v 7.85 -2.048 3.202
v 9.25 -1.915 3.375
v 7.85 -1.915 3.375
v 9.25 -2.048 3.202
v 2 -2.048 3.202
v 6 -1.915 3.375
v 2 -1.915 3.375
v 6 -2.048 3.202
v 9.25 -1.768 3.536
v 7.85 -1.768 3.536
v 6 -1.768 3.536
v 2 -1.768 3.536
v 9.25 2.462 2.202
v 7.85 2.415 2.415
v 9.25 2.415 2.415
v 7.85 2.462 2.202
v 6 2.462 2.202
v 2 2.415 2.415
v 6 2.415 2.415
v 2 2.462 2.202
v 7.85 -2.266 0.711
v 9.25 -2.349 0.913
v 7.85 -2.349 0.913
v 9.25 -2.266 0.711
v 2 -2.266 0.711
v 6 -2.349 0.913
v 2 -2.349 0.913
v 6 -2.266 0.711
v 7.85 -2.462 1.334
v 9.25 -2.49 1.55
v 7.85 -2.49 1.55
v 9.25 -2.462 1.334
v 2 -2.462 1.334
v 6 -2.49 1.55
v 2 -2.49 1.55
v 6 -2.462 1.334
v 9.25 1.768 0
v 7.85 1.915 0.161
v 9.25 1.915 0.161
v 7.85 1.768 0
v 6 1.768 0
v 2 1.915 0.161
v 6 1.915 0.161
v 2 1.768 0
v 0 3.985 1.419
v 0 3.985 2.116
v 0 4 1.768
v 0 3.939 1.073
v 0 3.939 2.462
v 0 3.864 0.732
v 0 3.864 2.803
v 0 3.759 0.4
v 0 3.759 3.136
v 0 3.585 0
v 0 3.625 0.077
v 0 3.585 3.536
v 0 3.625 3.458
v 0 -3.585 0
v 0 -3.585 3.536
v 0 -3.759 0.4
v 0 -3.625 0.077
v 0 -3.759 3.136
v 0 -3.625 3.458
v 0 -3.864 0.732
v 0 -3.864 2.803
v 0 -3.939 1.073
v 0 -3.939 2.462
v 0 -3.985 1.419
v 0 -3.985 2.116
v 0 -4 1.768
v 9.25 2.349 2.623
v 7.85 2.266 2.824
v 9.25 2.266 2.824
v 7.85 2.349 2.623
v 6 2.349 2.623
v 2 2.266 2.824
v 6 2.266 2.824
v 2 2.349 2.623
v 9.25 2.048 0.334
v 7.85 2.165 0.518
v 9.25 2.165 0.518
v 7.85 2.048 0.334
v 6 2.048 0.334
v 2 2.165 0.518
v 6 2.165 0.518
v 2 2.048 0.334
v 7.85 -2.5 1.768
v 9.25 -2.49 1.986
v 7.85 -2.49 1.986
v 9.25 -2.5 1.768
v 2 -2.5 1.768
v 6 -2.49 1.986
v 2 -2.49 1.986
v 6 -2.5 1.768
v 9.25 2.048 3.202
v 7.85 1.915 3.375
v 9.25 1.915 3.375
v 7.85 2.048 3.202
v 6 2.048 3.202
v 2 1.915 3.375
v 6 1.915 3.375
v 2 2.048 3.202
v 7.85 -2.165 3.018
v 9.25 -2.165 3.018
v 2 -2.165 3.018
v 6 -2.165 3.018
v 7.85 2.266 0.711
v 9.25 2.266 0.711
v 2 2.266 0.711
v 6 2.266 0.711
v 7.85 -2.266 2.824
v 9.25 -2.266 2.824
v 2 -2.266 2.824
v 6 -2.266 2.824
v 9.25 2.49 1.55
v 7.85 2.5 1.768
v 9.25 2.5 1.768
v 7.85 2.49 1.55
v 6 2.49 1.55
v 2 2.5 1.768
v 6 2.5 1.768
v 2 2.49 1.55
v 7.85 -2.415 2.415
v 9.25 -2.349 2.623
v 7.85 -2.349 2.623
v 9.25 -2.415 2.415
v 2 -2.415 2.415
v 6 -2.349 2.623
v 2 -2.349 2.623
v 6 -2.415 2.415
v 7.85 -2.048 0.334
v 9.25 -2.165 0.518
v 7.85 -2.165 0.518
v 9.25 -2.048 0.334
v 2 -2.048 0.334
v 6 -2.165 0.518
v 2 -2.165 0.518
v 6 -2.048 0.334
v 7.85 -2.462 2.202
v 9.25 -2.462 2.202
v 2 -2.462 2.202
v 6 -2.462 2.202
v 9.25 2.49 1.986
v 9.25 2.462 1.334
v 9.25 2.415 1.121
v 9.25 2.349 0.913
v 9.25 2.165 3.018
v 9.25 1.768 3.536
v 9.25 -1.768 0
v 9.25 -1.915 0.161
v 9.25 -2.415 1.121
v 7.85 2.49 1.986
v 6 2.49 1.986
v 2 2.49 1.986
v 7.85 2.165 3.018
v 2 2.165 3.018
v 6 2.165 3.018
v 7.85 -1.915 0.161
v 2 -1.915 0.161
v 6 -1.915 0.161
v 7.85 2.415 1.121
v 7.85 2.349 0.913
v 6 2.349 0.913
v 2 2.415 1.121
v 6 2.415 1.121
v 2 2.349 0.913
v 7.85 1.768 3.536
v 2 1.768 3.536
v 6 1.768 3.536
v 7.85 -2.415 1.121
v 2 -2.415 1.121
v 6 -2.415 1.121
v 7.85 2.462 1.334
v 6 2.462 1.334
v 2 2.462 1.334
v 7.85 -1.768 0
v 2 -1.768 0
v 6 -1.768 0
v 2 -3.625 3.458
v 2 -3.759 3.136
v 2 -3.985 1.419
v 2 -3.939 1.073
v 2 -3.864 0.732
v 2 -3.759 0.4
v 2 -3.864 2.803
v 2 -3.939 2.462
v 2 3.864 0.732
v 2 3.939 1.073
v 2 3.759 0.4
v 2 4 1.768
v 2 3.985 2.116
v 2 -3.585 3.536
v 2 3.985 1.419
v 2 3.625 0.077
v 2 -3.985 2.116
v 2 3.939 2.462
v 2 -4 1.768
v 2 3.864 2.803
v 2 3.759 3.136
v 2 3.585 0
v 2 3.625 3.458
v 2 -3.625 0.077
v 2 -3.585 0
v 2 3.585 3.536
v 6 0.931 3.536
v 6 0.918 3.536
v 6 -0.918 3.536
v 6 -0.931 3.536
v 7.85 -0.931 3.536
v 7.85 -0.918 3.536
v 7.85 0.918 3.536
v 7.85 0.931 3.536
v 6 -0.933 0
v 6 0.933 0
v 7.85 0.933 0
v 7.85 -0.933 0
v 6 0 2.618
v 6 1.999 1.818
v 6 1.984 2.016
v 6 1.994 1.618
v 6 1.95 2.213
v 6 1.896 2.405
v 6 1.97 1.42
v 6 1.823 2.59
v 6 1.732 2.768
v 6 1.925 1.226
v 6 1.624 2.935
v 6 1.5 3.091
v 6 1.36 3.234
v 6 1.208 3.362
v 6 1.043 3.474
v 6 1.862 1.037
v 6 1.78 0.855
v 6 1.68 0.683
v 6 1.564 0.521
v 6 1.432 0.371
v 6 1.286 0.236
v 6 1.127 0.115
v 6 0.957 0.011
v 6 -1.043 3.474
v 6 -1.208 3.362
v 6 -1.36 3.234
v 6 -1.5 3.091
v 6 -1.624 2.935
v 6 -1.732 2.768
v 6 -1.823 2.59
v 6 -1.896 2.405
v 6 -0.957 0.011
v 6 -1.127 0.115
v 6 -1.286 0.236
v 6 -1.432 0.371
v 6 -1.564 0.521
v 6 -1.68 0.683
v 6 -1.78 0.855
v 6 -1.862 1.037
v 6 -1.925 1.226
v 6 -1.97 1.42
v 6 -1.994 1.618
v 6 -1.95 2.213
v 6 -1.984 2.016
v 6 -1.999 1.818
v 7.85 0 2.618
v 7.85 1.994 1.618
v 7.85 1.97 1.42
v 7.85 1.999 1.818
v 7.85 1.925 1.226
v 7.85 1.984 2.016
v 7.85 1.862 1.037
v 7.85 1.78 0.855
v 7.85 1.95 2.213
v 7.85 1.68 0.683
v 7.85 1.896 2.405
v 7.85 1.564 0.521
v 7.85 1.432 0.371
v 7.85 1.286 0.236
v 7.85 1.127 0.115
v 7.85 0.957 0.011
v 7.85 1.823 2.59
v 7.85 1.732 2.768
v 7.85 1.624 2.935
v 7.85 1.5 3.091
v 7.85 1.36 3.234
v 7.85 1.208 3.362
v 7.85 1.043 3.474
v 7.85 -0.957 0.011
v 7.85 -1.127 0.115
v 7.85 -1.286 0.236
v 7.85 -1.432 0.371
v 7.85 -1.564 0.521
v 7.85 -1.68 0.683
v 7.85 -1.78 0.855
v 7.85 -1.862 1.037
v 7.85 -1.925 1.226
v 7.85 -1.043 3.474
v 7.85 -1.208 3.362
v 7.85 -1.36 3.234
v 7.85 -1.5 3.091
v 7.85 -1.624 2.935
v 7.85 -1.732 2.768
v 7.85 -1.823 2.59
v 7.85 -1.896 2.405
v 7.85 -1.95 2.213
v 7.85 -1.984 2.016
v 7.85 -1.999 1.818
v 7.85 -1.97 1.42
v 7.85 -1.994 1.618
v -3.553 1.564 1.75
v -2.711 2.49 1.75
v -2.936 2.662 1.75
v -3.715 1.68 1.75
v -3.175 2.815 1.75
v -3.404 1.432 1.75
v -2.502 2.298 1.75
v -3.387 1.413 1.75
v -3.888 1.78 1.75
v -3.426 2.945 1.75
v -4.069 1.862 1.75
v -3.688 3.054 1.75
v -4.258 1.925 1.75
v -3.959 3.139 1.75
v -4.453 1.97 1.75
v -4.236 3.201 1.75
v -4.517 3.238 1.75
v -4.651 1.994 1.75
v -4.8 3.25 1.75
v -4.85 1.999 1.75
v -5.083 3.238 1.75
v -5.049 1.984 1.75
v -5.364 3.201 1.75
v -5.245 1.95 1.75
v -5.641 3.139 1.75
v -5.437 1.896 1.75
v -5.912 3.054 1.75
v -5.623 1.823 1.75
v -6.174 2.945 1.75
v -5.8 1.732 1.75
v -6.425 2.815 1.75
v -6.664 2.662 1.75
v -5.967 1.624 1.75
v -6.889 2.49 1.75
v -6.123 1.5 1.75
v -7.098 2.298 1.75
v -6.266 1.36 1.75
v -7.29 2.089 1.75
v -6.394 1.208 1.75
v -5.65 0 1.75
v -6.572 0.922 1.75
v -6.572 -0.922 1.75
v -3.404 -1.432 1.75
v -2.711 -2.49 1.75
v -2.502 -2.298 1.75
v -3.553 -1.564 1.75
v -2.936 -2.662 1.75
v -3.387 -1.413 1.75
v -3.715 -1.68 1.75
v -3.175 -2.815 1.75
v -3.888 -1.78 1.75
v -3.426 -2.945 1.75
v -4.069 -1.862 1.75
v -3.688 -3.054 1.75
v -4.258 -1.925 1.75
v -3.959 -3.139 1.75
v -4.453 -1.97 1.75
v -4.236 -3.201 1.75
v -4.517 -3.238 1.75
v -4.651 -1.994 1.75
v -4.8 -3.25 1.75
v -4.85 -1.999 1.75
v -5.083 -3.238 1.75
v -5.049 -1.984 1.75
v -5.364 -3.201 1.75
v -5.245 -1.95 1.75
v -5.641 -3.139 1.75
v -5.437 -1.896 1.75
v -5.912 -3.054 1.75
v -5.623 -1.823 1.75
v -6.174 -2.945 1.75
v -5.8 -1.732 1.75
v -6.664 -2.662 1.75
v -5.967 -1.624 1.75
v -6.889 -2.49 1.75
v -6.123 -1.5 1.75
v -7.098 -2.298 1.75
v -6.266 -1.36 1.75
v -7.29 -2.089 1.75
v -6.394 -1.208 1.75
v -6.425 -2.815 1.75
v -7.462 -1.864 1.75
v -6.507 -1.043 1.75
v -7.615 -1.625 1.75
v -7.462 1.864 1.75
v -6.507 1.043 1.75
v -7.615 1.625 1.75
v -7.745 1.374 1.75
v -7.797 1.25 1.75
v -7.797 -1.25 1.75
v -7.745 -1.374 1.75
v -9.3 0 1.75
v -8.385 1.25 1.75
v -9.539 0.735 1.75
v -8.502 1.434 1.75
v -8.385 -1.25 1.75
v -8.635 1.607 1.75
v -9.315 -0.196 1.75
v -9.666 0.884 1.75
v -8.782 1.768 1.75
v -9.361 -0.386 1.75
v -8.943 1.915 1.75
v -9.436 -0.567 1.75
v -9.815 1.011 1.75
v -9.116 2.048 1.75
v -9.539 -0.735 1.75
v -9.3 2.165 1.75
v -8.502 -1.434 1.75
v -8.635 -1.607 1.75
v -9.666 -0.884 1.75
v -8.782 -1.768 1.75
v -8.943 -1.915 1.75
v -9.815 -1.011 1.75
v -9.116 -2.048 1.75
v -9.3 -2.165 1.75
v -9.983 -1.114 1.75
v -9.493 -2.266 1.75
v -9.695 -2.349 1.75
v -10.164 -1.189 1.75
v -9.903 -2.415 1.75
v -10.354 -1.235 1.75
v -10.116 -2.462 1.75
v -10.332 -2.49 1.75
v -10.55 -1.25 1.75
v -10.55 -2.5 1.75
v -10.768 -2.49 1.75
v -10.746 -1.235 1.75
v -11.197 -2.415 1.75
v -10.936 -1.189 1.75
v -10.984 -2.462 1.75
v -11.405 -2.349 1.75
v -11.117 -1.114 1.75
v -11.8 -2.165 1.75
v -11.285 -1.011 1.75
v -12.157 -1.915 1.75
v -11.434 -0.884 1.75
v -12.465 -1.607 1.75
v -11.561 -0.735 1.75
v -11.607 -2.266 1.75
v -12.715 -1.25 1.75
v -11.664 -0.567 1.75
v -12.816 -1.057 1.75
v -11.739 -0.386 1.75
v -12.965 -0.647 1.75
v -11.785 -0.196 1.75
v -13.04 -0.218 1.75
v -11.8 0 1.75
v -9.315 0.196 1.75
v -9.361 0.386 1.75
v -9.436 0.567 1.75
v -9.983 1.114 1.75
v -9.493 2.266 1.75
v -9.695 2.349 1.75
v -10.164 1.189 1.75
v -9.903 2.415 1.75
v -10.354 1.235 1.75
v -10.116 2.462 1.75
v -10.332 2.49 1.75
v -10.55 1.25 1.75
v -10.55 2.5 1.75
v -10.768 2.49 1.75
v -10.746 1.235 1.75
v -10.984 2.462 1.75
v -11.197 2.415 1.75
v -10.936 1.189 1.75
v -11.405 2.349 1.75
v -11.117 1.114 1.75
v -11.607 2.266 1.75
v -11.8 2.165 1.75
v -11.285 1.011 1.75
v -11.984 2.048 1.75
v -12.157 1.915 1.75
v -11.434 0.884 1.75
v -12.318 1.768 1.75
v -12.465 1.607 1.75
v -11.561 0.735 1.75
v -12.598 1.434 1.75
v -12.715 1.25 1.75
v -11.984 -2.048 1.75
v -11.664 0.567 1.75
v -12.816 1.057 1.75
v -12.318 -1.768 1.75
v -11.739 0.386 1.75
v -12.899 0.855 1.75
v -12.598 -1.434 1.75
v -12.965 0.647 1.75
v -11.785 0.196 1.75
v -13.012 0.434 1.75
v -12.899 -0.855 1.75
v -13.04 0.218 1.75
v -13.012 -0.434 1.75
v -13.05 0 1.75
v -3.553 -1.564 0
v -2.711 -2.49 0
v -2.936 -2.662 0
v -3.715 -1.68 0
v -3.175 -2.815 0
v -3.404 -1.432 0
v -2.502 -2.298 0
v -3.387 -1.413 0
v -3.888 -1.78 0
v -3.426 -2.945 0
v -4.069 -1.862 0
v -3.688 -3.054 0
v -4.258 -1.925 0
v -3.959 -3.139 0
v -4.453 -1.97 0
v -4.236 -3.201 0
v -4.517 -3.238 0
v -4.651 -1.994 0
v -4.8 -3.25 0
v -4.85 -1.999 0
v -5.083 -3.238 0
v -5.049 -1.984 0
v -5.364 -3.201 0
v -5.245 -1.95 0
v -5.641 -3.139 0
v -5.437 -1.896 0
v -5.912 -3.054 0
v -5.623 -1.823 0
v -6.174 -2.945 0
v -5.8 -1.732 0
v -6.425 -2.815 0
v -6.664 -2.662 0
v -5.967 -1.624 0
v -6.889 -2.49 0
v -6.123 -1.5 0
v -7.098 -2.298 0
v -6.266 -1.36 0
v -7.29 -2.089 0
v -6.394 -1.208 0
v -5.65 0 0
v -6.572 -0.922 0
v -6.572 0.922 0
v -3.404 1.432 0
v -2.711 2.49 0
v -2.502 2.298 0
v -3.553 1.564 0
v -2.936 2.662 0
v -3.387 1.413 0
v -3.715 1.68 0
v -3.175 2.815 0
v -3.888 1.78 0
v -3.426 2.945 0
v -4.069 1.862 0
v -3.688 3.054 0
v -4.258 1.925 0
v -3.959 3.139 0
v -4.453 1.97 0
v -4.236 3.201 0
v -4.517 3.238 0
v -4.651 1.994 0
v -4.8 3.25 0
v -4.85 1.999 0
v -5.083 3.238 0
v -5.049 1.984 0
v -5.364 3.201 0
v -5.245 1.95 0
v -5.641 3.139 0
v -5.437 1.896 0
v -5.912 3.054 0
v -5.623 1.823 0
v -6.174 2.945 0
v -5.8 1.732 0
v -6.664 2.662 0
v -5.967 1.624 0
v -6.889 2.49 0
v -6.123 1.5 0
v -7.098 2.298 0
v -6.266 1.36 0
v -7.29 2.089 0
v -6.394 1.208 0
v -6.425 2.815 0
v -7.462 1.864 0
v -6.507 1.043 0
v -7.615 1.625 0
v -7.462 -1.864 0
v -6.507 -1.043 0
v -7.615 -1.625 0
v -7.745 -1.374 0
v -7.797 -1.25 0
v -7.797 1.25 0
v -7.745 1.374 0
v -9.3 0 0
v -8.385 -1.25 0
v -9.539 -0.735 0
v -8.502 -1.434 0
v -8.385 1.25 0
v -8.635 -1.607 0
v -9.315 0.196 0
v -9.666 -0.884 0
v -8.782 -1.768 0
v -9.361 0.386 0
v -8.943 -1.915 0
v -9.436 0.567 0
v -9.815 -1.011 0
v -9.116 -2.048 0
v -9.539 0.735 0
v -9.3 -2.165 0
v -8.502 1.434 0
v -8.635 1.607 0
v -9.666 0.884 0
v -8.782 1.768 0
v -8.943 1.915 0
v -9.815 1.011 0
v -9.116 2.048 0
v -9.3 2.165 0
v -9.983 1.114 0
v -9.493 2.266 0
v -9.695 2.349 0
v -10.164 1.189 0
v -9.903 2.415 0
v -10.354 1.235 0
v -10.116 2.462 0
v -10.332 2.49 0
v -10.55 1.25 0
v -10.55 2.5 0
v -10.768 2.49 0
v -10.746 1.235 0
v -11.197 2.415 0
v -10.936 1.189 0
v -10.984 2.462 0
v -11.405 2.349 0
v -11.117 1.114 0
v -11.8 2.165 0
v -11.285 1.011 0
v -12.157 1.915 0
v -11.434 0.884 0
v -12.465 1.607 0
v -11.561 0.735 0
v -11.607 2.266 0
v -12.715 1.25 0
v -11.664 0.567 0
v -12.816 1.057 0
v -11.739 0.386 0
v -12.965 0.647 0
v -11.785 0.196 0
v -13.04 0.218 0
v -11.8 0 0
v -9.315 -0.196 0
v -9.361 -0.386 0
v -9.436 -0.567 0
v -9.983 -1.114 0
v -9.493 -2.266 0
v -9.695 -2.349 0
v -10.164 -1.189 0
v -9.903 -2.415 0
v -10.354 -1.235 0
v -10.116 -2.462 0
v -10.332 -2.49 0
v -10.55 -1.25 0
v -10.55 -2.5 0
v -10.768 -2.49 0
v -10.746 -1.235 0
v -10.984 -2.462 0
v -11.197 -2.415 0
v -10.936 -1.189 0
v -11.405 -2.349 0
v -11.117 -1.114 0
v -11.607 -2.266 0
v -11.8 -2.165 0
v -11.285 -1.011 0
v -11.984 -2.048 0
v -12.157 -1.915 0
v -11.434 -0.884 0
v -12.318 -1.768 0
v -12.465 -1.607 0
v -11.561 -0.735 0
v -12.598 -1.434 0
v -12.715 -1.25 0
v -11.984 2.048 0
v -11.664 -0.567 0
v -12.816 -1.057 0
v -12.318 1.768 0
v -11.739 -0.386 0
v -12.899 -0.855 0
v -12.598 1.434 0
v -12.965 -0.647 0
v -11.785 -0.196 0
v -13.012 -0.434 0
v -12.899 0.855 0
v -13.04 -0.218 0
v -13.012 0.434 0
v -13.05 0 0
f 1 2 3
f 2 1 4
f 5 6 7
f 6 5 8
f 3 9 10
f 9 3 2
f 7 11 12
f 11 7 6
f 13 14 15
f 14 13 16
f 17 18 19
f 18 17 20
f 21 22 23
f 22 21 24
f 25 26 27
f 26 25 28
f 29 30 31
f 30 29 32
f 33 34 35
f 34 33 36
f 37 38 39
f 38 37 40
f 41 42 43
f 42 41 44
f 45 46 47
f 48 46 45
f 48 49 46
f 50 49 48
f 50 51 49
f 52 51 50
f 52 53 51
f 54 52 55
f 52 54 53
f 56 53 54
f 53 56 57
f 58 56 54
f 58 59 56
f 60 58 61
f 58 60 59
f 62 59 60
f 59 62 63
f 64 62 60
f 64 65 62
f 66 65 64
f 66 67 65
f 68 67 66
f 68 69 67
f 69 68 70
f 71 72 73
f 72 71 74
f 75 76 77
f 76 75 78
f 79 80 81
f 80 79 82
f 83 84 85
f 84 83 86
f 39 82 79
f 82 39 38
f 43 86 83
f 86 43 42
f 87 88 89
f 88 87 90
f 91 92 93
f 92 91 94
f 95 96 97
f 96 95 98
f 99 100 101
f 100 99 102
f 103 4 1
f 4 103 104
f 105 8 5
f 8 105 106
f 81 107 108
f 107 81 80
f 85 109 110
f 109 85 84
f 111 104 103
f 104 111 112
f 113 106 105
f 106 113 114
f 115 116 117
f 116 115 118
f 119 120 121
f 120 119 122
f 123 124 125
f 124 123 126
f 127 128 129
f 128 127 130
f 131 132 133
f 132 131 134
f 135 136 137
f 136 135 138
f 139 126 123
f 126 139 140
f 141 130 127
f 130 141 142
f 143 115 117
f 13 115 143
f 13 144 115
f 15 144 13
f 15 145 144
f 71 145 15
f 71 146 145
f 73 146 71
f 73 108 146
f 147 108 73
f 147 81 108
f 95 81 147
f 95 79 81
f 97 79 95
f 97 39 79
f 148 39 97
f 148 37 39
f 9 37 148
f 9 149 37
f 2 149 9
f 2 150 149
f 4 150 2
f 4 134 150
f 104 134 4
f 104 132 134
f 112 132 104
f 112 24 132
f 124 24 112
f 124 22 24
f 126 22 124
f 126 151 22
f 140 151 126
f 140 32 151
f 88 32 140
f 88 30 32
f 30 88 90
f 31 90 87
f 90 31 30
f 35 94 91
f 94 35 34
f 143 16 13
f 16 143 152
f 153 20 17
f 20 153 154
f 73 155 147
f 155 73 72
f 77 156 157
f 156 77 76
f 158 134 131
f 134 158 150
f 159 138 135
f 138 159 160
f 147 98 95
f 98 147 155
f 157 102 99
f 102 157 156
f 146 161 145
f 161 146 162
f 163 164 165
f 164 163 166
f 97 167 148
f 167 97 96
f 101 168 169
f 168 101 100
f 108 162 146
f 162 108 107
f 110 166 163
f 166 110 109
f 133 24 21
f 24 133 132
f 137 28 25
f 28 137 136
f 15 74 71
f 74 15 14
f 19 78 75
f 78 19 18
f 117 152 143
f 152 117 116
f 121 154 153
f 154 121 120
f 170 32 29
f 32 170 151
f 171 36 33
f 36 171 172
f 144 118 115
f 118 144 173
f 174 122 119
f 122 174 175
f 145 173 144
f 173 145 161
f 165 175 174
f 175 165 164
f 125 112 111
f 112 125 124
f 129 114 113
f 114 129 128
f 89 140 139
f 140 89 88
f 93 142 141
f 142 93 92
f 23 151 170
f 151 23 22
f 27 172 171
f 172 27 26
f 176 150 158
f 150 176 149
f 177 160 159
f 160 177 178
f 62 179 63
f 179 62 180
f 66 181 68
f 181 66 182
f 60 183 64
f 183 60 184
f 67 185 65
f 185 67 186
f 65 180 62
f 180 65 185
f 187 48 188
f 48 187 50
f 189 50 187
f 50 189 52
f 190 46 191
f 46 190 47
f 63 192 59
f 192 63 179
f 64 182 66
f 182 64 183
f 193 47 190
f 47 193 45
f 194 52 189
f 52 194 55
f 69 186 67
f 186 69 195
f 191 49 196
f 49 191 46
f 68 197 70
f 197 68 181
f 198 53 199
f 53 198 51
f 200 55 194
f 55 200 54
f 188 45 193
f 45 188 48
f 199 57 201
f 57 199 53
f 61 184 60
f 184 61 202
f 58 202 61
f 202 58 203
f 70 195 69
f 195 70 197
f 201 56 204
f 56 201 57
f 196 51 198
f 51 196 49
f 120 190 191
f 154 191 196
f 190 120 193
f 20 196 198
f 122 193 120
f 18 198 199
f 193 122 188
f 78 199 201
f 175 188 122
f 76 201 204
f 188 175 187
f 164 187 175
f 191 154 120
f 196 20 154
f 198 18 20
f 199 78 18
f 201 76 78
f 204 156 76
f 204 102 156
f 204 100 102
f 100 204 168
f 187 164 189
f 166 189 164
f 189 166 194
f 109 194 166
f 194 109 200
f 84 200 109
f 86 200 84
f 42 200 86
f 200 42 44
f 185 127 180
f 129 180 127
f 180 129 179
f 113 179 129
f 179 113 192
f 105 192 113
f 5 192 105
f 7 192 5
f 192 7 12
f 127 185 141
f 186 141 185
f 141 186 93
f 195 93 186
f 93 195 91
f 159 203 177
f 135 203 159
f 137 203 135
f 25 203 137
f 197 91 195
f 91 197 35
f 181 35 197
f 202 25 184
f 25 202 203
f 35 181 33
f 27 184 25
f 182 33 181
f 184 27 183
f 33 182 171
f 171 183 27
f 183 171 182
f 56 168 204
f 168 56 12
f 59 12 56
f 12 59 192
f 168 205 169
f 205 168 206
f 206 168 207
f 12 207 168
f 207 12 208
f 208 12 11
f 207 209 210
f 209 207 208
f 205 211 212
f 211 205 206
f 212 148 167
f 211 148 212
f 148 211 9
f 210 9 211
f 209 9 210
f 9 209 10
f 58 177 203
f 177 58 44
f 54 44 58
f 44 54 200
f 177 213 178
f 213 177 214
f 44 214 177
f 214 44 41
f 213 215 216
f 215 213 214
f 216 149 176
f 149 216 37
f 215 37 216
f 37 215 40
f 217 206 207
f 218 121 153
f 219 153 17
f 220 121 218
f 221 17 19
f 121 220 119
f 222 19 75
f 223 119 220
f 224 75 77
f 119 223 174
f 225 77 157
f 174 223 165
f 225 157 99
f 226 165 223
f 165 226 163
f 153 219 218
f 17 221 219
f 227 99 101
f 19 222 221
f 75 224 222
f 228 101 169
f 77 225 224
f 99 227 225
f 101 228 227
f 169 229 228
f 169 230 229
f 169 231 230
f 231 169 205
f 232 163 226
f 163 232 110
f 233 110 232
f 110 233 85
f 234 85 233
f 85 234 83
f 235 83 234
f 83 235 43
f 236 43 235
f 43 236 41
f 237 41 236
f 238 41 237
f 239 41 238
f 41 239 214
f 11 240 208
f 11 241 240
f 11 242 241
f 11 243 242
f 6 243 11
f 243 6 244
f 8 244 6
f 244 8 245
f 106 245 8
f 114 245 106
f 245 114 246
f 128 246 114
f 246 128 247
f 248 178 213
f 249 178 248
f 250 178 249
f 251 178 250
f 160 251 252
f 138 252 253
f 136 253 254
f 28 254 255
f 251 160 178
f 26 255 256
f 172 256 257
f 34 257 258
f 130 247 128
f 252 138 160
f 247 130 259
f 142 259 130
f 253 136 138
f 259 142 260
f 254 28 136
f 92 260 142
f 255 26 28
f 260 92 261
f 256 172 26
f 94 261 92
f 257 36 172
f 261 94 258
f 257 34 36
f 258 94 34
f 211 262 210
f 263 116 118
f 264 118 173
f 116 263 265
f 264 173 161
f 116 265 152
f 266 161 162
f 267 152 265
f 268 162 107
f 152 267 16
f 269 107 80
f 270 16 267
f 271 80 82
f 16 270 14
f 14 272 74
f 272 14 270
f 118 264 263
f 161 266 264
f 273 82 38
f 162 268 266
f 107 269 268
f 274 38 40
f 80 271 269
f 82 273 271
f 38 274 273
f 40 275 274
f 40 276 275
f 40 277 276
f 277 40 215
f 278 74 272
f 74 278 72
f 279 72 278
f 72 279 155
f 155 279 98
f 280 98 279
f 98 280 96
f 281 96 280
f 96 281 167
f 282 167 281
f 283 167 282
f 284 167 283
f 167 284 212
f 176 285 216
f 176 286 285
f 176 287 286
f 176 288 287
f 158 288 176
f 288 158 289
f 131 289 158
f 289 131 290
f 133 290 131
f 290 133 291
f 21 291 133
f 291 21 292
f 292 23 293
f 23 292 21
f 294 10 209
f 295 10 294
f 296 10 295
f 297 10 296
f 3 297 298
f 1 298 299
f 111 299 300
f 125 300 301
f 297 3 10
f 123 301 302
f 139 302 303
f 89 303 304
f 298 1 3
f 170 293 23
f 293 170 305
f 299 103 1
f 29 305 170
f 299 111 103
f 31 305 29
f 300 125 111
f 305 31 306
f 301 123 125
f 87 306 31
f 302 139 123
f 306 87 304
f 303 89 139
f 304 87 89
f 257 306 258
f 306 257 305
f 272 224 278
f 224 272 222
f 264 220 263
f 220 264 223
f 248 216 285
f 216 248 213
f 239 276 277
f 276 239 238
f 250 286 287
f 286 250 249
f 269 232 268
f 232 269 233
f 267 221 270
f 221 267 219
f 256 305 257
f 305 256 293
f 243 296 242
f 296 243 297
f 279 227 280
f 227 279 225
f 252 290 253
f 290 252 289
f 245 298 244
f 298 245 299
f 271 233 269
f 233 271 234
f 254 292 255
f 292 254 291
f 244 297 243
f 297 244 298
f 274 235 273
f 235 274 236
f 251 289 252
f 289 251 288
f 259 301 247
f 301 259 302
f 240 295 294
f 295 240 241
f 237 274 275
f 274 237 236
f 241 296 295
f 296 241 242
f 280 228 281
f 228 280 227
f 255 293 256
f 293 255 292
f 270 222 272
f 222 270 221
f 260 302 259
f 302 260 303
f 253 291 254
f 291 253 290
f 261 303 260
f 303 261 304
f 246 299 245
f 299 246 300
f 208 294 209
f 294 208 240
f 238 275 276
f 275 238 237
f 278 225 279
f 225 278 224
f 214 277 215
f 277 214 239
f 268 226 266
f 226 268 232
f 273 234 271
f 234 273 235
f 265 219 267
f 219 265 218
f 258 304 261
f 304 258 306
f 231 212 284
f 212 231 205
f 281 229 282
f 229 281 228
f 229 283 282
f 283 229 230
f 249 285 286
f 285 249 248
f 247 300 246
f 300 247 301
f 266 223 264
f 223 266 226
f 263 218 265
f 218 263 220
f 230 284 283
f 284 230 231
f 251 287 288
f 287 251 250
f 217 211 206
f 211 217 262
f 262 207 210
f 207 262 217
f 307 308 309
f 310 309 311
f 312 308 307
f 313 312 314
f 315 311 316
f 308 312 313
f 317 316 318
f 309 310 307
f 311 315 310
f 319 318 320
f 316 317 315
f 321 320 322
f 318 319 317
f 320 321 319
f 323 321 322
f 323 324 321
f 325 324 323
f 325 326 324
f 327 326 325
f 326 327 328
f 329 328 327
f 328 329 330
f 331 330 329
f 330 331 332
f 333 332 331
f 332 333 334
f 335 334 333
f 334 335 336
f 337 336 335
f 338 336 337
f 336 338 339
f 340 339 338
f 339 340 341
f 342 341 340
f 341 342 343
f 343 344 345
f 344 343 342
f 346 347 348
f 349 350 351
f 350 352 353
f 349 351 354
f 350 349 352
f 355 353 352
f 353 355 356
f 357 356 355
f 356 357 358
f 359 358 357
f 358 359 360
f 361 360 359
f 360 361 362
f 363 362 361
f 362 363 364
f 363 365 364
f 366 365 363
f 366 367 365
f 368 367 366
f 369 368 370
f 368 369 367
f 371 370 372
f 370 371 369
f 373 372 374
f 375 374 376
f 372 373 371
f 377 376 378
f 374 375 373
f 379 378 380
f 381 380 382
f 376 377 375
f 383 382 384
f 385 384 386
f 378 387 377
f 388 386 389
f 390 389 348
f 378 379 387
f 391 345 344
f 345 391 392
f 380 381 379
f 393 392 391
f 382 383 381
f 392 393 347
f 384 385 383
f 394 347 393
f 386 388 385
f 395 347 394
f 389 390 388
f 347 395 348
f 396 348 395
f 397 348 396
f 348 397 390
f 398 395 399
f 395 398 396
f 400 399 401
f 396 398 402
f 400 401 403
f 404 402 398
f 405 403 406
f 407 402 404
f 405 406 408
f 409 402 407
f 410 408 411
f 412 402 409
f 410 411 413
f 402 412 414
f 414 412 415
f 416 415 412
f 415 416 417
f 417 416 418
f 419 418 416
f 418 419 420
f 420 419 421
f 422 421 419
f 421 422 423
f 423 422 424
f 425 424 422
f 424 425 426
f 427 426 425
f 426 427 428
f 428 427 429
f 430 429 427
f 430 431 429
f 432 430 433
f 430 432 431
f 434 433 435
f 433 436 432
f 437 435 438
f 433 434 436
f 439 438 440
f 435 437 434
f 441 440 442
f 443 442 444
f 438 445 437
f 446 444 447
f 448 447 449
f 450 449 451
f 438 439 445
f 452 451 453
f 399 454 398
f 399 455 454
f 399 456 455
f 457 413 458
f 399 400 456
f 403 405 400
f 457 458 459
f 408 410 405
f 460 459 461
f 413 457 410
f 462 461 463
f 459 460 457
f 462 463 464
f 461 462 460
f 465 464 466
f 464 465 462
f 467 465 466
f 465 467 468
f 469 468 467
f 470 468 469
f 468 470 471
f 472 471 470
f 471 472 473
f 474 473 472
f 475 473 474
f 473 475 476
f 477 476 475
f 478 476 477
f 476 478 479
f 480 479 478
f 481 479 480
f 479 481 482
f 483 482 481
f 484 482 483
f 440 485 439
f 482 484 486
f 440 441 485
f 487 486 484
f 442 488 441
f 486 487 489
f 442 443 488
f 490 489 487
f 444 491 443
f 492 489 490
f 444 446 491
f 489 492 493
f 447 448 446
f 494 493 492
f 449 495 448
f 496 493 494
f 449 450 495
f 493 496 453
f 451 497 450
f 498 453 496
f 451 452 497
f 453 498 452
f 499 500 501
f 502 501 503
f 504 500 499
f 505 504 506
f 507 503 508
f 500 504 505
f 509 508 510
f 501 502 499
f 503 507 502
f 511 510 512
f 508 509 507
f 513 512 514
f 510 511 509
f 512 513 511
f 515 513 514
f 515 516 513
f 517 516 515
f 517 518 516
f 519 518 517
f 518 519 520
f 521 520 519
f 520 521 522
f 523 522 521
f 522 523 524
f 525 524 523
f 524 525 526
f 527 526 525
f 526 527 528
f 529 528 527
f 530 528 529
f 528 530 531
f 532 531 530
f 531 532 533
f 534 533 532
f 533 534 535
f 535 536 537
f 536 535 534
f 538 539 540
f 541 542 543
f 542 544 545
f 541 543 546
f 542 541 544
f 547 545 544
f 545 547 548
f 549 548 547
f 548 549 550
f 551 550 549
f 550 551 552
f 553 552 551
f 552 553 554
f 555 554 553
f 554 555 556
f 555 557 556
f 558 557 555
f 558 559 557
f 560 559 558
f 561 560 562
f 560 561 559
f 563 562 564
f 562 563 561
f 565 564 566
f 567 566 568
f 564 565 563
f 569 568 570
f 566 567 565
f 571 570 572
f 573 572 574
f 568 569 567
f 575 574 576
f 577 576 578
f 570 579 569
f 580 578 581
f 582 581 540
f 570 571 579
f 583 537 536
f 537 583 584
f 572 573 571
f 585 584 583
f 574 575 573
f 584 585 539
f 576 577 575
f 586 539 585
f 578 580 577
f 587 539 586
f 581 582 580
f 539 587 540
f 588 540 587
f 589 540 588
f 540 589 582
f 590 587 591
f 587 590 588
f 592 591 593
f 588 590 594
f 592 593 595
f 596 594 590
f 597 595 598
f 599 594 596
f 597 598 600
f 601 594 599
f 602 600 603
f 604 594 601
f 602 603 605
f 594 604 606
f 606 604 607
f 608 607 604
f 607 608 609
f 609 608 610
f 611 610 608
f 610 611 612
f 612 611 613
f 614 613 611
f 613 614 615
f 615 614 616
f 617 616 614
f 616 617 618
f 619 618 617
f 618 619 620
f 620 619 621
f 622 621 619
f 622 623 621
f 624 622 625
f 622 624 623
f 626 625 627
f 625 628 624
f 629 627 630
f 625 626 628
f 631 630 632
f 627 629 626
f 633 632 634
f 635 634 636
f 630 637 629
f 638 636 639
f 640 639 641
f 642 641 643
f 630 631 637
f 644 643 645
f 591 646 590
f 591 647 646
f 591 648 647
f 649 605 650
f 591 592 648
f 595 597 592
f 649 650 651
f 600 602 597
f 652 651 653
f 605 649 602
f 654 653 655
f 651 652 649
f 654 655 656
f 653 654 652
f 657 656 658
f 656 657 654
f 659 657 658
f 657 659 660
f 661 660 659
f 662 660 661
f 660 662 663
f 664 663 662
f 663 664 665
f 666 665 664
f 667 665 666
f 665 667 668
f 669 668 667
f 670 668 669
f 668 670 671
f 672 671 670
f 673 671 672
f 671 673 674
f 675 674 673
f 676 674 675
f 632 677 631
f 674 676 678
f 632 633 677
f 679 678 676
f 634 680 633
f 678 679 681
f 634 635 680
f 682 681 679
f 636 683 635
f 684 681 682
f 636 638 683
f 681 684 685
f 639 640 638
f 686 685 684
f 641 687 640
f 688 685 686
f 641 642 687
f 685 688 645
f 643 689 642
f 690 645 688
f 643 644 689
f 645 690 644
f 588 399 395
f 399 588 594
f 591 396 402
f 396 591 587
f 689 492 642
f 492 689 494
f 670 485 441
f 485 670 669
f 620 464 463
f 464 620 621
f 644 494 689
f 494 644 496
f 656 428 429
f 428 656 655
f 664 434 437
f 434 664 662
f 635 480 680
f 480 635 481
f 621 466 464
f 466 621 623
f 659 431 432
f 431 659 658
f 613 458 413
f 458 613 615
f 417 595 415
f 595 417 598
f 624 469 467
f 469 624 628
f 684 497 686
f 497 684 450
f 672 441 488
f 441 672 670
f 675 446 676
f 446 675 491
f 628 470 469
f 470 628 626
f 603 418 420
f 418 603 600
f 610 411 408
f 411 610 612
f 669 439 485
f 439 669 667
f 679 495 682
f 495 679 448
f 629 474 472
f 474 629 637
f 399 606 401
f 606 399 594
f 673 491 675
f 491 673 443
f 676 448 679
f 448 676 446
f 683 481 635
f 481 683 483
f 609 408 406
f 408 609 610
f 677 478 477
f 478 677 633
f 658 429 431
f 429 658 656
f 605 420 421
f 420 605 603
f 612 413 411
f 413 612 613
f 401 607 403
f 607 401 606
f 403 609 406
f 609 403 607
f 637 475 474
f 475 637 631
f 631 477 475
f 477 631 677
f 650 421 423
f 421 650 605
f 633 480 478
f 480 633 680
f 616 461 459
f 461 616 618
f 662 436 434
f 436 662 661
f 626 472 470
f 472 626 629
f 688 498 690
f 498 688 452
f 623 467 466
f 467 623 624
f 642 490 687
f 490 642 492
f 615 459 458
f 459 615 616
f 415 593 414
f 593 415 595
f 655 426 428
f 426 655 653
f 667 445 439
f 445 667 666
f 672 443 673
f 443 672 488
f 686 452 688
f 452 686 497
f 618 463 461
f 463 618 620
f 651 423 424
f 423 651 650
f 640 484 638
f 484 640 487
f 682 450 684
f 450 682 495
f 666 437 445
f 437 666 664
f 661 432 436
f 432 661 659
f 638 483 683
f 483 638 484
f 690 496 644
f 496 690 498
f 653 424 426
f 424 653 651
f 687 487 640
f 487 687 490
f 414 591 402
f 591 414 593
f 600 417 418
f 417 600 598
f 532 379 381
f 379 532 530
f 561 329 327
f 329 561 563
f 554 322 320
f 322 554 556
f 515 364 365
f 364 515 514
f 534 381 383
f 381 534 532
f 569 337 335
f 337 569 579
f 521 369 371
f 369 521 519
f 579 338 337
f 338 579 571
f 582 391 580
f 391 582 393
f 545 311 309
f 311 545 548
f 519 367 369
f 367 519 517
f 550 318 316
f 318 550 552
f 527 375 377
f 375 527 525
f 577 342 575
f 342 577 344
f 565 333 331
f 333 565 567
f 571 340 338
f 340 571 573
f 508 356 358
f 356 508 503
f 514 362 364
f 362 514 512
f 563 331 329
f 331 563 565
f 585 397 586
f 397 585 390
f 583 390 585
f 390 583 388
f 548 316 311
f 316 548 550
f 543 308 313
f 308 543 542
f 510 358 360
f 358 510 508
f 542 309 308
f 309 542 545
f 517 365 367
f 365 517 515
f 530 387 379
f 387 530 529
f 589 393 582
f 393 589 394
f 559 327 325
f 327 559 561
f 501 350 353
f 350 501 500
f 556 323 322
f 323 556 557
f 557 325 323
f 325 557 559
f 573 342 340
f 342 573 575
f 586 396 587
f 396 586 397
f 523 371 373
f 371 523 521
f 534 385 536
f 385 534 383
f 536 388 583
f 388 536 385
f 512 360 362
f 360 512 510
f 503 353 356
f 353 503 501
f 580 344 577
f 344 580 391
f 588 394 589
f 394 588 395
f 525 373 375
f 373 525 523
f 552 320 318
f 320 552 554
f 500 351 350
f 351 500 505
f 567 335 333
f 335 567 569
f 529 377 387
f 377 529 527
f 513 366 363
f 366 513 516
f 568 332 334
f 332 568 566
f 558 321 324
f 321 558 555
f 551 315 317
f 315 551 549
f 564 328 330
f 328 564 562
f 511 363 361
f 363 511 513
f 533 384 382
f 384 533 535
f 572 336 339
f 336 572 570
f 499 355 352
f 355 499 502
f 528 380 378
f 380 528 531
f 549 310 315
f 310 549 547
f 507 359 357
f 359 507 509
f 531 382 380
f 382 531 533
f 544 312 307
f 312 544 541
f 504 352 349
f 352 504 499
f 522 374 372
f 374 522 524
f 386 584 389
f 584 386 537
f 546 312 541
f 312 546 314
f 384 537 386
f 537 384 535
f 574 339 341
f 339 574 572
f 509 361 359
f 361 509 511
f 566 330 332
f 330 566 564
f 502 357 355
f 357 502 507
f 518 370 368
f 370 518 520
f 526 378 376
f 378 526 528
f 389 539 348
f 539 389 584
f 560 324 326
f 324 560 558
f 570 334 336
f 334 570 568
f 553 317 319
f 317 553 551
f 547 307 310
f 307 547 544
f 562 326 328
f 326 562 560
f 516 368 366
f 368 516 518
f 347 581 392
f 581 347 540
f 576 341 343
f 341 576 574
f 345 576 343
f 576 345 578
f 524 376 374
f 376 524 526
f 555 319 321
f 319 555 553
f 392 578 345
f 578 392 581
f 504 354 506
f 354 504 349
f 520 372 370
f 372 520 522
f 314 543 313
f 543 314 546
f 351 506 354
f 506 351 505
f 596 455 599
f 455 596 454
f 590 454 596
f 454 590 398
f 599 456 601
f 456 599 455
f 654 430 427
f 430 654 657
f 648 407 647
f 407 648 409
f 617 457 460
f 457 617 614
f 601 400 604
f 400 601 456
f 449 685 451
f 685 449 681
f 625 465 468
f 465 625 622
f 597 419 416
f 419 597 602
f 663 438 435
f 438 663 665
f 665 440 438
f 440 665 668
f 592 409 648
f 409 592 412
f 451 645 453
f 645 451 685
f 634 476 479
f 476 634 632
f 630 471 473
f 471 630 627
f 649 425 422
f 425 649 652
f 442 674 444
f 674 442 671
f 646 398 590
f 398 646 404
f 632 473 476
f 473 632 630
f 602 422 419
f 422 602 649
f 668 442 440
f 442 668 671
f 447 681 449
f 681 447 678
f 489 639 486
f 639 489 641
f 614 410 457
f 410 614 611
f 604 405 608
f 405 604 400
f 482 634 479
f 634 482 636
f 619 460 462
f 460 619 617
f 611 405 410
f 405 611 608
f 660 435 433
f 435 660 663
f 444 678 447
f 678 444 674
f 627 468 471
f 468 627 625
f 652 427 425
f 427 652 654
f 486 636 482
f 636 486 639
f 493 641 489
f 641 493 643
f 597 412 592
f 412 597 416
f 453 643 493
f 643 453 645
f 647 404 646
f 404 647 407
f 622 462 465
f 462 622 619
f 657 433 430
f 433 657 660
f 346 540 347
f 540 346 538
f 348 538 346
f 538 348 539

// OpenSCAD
// [FL_INDEX: keywords="openscad, 3d_parametric, Sheet_Pin, csg_solid" | COT="Parametric OpenSCAD design from 3DCodeverse"]
// Title: Sheet Pin

//Part
part = "both"; // [pin,snapring,both,cutter]

//Axle diameter
daxle = 5;

//Thickness of material to hold together
tsheet = 4;

//Head Diameter   -- make relative
dhead = 8;

//Thickness of head 
thead = 2;


// How many handles shall the snap ring have? recomm:(1,3)
handle = 1; // [0,1,2,3,4]

//Depth of groove for snap ring
ddgroove =1;

//Snap ring thickness
tsnap = 1.75;

//Snap ring radial thickness (must be greater than groovedepth)
ddsnapring = 2.5;

//overstand on snap ring side
tover = 1.5;

// radial cutter clearance
tclear = 0.1;

// clearing
clr = 0.1;




/*
2013 Lukas Süss
A pin & clamping ring combo to clamp thin plates together.
e.g. usable as connectors for scissor mechanisms.
*/


$fa= 5;
$fs=0.2;



if(part == "pin"){ pin(); }
if(part == "snapring"){ snapring(); }
if(part == "both")
{ 
  pin();
  translate([-dhead*0.6,0,0]) snapring();
}
if(part == "cutter"){ cutter(); }



module pin(t=0)
{
  tges = thead+tsheet+tsnap+tover; 
  cutrat = 1/sqrt(2); // 1/sqrt(2) | cos(30)
  din = daxle-ddgroove;

  translate([0,0,((daxle)*cutrat+2*t)/2])
  difference()
  {
    intersection()
    {
      rotate(90,[0,1,0])
      union()
      {
        cylinder(r=daxle/2+t,h=tges);
        cylinder(r=dhead/2+t,h=thead);
      }
      cube([tges*3,20,(daxle)*cutrat+2*t],center=true);
    }
    rotate(90,[0,1,0]) translate([0,0,thead+tsheet])
    {
      difference()
      {
        cylinder(r=daxle/2*1.2+t,h=tsnap+clr);
        translate([0,0,-tsnap*0.1])
        cylinder(r=(daxle-ddgroove)/2+t,h=tsnap*1.2);
      }
      // rotation retention spike
      translate([-din/2-clr,0,]) cylinder(r=daxle/2*0.5,h=tsnap+clr,$fn=4);
    }

  }
}

module snapring()
{
  dout = daxle-ddgroove+ddsnapring;
  din = daxle-ddgroove;
  dhandle = 2.5;
  shift = dhandle*1.5;

  difference()
  {
    union()  // base body
    {
      cylinder(r=dout/2,h=tsnap);
      if (handle > 0)
      {
        for(i=[-(handle-1)/2:+(handle-1)/2])
        {
          rotate(90*i,[0,0,1])
          {
            translate([-shift/2 -din/2,0,tsnap/2])
            cube([shift,ddsnapring,tsnap],center=true);
 
            translate([-shift -din/2,0,0])
            cylinder(r=(dhandle+ddsnapring)/2,h=tsnap);
          }
        }
      } 

    }

    translate([0,0,-tsnap*0.1]) // main cemntral cuts
    {
      cylinder(r=din/2,h=tsnap*1.2);
      rotate(-45,[0,0,1])
      cube([dout*0.6,dout*0.6,tsnap*1.2]);
    }

    if (handle > 0) // handle hole cutting
    {
      for(i=[-(handle-1)/2:+(handle-1)/2])
      {
        rotate(90*i,[0,0,1])
        {
          translate([-shift -din/2,0,-tsnap*0.1])
          cylinder(r=dhandle/2,h=tsnap*1.2);
        }
      }
    }

  }
  //rotation retention spike
  translate([-din/2-clr,0,0]) cylinder(r=daxle/2*0.5,h=tsnap,$fn=4);
}

module cutter(clearance)
{
  pin(t=clearance);
}
